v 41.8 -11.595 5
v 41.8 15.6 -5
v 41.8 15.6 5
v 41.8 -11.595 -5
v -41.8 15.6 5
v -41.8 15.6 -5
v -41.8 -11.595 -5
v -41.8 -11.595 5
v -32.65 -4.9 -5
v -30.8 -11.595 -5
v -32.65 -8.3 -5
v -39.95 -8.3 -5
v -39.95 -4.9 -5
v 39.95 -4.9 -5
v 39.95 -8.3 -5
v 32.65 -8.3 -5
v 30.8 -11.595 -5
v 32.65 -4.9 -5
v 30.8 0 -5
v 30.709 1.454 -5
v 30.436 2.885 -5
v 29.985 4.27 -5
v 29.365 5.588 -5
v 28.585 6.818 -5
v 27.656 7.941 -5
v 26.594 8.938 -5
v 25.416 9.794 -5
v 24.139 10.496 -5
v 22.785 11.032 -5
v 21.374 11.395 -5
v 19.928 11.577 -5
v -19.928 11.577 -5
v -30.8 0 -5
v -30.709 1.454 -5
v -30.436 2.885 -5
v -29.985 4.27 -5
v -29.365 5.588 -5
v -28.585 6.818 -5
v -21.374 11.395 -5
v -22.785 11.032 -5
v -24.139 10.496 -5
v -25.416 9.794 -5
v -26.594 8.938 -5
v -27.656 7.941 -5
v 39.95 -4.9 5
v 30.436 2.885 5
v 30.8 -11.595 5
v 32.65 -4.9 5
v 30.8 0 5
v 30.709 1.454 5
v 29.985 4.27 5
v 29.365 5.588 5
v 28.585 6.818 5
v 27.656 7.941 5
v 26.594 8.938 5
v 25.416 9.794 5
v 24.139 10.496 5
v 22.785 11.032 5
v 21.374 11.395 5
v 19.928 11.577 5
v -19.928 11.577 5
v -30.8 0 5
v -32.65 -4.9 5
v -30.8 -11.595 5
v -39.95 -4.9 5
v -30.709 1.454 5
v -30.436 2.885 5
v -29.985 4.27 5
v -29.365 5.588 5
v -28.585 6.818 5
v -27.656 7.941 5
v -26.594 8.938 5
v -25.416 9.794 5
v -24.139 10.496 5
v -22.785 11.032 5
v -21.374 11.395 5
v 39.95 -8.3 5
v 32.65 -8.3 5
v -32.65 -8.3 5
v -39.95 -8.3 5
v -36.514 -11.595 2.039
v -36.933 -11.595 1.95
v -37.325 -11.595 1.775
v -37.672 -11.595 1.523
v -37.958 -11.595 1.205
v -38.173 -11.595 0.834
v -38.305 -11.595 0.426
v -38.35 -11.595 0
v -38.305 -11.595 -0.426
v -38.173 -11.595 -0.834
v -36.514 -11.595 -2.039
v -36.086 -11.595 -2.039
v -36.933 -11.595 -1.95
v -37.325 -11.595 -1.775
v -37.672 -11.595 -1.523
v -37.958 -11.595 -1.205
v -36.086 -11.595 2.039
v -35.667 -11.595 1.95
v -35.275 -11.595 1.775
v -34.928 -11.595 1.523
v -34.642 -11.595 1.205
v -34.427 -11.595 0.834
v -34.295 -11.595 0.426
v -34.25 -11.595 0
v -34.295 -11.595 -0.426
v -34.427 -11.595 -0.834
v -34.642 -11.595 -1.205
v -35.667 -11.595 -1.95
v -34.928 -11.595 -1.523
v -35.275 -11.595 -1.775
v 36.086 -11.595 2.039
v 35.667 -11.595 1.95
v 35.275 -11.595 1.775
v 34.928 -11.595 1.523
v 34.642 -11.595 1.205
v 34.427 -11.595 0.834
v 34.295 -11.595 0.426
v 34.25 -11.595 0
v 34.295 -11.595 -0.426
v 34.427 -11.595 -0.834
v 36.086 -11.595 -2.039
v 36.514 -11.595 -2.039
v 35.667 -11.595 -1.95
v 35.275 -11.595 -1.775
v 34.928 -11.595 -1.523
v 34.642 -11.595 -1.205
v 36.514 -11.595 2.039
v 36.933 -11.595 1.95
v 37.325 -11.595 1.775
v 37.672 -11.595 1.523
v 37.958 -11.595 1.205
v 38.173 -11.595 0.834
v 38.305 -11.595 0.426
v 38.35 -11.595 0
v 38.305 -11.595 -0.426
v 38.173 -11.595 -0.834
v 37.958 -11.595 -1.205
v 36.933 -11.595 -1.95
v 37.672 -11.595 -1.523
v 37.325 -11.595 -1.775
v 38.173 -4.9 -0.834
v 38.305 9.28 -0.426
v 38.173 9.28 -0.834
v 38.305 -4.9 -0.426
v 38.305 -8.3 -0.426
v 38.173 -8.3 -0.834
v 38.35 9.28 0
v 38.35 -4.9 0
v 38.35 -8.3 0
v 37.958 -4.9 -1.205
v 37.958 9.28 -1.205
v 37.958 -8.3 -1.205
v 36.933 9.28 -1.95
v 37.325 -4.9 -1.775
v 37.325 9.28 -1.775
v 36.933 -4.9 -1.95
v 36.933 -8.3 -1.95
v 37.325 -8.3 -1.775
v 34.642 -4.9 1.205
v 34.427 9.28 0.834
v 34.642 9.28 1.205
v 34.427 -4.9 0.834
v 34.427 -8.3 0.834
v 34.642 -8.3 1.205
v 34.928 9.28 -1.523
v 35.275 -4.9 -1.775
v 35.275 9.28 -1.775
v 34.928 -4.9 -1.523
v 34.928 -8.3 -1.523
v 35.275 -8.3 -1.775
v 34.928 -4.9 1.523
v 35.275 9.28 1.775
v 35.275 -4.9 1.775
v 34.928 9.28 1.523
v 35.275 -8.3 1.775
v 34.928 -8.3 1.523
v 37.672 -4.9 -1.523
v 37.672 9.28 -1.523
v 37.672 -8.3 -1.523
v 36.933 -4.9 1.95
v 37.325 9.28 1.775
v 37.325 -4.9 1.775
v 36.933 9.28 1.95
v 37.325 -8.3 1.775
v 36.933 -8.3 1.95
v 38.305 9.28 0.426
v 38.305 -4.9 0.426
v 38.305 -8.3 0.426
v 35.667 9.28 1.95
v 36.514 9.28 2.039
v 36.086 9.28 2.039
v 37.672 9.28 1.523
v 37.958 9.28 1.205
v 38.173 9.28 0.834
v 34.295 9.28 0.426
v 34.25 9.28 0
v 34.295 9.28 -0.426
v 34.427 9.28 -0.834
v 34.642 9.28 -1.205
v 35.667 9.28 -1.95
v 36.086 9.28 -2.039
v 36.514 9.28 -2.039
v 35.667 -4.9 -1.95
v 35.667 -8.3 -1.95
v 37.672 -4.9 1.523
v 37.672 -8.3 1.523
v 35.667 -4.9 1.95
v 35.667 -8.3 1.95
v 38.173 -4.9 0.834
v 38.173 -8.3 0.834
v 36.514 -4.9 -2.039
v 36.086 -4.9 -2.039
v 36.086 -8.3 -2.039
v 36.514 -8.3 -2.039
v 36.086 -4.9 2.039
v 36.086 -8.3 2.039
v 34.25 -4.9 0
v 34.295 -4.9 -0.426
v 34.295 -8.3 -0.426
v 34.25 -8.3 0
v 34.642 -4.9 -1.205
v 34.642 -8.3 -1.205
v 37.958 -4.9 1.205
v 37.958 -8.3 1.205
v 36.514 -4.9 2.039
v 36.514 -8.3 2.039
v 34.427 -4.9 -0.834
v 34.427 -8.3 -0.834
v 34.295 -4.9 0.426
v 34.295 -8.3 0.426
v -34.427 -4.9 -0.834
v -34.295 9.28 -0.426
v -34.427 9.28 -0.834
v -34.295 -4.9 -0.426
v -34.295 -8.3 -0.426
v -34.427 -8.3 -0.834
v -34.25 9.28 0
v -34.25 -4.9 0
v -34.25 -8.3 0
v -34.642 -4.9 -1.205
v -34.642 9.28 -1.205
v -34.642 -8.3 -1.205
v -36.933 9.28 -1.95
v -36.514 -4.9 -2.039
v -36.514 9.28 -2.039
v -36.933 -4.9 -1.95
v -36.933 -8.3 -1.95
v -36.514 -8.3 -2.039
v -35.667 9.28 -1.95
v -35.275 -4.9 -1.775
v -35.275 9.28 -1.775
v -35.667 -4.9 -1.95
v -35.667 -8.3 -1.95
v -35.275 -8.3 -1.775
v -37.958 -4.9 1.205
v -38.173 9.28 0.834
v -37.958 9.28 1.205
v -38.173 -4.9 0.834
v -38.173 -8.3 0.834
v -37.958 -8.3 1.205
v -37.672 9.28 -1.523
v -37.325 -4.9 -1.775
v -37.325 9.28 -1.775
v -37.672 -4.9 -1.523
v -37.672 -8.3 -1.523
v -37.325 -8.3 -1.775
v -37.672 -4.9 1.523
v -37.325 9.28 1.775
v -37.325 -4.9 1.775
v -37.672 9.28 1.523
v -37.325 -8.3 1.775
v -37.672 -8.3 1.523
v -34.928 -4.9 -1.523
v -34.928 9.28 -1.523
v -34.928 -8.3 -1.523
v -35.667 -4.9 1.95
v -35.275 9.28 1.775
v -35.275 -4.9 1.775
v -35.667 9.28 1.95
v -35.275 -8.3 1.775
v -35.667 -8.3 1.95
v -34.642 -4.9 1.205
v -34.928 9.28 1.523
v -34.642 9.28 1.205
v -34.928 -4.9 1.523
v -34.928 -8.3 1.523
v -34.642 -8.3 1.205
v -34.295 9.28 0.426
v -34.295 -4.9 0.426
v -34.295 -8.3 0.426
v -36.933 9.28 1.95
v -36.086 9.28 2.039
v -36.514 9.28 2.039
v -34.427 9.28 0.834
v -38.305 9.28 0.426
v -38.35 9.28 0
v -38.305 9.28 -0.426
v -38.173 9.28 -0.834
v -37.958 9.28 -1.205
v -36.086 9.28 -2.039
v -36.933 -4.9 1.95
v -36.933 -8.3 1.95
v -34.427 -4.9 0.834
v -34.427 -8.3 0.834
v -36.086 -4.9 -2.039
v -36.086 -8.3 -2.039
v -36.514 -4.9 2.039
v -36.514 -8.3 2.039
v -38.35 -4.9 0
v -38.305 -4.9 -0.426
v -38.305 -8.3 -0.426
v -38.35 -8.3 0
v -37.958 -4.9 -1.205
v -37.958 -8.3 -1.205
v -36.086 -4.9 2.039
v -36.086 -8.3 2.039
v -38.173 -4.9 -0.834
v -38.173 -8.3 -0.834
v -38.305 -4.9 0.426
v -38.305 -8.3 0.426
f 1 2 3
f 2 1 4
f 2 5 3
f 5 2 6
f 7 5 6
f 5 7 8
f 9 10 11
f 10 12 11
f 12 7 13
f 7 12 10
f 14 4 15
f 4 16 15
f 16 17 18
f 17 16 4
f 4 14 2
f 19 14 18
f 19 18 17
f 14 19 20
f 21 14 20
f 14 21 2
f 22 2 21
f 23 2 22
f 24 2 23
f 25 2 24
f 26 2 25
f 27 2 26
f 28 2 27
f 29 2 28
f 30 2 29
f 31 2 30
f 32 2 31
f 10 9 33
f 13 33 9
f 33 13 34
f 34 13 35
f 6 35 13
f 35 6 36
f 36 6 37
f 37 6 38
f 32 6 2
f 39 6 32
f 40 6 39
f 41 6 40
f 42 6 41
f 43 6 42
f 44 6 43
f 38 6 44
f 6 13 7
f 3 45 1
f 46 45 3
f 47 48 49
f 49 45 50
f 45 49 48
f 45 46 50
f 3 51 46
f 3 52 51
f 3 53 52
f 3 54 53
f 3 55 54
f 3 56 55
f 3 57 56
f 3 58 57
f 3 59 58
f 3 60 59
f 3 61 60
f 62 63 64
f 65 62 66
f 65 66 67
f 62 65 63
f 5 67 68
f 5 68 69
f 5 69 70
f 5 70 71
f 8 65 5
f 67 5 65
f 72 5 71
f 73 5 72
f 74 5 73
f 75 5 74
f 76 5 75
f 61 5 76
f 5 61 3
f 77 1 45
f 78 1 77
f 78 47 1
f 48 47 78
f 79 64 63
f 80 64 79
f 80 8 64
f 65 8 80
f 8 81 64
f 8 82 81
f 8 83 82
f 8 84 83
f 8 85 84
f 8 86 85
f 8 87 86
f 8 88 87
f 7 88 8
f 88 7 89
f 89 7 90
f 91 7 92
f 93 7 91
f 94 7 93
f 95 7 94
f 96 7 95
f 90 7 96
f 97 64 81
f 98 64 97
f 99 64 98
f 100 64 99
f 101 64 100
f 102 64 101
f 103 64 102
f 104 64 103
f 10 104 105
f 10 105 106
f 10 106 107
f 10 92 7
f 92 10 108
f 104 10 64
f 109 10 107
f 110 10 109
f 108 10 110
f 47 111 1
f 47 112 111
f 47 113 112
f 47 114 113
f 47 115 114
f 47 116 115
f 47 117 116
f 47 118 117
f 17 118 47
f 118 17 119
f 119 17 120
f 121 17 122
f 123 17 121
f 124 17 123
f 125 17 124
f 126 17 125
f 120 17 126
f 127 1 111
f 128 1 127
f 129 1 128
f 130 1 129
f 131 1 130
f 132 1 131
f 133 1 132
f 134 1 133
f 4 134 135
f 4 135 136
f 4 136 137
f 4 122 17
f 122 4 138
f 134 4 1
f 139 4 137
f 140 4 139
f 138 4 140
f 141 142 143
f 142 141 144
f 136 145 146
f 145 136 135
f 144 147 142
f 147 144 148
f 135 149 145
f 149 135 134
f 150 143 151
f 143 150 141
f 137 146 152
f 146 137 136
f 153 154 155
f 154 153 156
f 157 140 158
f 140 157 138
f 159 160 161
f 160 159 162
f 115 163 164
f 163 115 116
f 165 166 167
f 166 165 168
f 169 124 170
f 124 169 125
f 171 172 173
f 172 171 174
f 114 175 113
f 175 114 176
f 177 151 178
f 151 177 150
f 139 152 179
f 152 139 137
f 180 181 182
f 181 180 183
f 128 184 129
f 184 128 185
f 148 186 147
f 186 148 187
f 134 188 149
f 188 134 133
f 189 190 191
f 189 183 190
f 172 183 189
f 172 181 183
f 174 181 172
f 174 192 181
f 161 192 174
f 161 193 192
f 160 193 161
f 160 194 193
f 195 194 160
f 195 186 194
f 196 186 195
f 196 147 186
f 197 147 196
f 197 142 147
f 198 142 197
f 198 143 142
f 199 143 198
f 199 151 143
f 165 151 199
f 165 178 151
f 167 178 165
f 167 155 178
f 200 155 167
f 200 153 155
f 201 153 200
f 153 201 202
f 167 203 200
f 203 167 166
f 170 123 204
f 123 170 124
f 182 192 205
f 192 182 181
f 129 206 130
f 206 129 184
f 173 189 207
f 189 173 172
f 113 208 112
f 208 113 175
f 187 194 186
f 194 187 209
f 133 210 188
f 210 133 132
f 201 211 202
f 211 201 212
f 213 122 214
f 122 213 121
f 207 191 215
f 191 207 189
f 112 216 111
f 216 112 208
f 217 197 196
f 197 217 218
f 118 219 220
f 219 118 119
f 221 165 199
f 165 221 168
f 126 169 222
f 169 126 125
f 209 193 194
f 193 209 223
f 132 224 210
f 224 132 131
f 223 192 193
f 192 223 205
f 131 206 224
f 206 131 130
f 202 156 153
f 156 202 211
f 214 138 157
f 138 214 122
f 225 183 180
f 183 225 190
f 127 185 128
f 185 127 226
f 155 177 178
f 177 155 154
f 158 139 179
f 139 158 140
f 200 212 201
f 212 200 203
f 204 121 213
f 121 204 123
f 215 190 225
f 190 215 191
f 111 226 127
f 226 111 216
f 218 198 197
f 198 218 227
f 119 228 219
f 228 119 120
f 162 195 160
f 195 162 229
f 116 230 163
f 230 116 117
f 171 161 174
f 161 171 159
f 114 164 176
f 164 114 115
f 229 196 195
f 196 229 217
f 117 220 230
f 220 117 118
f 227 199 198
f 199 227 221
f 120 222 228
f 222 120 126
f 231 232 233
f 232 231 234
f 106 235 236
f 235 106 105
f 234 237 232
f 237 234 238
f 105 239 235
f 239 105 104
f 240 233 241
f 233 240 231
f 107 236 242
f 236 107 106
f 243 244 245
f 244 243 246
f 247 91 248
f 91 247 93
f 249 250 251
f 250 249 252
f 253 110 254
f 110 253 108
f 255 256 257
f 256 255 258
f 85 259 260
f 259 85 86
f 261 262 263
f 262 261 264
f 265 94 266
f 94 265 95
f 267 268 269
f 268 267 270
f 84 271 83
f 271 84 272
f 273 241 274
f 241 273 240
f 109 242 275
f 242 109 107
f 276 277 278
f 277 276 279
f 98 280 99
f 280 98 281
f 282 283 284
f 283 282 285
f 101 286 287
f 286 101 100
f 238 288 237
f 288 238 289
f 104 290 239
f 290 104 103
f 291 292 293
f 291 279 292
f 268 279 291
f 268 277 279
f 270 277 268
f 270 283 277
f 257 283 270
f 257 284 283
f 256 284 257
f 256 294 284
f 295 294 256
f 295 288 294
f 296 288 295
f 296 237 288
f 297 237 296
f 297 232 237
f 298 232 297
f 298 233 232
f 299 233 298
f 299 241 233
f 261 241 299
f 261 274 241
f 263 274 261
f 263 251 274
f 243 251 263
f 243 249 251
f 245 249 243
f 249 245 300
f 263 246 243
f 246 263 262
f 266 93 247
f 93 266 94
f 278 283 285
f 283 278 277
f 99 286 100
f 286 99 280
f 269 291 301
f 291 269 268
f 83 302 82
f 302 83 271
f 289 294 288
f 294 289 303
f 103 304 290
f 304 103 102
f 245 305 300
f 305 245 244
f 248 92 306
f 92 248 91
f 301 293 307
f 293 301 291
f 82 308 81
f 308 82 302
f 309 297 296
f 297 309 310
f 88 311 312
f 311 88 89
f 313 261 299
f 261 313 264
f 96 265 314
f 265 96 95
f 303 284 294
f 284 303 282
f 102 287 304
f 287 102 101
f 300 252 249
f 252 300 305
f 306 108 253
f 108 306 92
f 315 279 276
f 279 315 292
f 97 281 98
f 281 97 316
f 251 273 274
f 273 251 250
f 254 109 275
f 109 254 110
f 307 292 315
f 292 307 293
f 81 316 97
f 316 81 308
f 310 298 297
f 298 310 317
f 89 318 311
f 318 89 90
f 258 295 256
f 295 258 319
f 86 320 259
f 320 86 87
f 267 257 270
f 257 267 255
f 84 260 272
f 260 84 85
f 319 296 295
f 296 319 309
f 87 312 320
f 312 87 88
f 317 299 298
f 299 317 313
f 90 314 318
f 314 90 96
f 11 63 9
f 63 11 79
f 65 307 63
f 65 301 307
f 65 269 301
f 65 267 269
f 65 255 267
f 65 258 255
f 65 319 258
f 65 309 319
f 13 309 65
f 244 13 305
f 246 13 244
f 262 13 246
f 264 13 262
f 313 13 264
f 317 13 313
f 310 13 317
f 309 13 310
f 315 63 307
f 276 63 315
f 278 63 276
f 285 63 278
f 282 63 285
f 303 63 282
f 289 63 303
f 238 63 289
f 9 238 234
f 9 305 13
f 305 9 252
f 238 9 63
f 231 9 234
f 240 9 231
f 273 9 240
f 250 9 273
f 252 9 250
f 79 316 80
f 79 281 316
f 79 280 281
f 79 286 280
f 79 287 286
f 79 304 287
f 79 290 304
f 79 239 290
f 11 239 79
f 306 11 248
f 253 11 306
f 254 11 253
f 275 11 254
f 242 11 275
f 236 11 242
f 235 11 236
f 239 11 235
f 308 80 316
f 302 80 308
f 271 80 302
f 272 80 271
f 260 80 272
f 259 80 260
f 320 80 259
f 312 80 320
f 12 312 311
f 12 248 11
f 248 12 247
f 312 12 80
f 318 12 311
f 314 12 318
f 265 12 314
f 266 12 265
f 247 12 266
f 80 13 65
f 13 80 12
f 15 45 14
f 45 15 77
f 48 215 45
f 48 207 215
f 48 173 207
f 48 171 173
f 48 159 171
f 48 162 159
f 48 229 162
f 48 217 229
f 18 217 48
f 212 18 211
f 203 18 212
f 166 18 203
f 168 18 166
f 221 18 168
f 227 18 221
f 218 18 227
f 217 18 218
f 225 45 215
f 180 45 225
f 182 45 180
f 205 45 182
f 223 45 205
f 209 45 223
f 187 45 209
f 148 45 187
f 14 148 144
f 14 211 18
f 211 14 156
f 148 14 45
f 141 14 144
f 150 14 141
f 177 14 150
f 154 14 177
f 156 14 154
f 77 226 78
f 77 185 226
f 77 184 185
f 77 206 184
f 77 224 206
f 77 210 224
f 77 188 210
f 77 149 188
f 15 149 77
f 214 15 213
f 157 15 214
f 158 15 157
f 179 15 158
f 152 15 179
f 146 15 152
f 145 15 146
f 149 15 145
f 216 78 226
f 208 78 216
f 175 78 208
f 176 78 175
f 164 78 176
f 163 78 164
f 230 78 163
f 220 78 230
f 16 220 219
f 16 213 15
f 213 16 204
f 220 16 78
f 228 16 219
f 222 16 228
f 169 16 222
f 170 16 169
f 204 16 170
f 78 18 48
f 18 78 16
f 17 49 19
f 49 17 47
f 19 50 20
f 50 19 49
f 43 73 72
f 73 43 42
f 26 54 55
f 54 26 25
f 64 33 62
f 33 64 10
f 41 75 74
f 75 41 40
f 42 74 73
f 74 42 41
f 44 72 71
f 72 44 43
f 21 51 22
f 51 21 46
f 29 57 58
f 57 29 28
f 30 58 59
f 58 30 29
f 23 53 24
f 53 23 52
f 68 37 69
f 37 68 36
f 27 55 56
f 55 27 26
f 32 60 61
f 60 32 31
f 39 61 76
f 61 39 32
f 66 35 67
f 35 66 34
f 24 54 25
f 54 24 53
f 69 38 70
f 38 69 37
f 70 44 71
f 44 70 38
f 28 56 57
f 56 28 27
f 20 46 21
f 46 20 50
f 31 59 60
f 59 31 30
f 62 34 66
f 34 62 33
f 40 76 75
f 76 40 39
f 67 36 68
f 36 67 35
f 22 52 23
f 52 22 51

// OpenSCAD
// file: module-avio.scad
module avio(width, height) {
    rotate([-90, 0, 0])
    translate([0, 0, -50])
    hull() {
        translate([-(width-height)/2, 0, 0])
            cylinder(100, d=height, $fn=50);
        translate([+(width-height)/2, 0, 0])
            cylinder(100, d=height, $fn=50);
        translate([-width/2, 0, 0])
            cube([width, height/2, 100]);
    }
}
// main file
width=61.6;
height=23.2;
depth=10;
nuthole=7.3;
nutheight=3.4;

use <module-avio.scad>;

module clamp() {
    difference() {
        cube([width+22, depth, height+8], center=true);
        // bottom
        translate([0, 0, -height])
            cube([2*width, 2*100, height+0.01], center=true);
        // holes
        $fn=30;
        translate([width/2+11/2, 0, -height])
            cylinder(1.4*height, d=4.1);
        translate([-width/2-11/2, 0, -height])
            cylinder(1.4*height, d=4.1);
        // nut hole
        translate([-(width+11)/2, 0, -height/2+5])
            cube([nuthole, 60, nutheight], center=true);
        translate([+(width+11)/2, 0, -height/2+5])
            cube([nuthole, 60, nutheight], center=true);

        avio(width, height);
    }
}

rotate([-90,0,0])
    clamp();
